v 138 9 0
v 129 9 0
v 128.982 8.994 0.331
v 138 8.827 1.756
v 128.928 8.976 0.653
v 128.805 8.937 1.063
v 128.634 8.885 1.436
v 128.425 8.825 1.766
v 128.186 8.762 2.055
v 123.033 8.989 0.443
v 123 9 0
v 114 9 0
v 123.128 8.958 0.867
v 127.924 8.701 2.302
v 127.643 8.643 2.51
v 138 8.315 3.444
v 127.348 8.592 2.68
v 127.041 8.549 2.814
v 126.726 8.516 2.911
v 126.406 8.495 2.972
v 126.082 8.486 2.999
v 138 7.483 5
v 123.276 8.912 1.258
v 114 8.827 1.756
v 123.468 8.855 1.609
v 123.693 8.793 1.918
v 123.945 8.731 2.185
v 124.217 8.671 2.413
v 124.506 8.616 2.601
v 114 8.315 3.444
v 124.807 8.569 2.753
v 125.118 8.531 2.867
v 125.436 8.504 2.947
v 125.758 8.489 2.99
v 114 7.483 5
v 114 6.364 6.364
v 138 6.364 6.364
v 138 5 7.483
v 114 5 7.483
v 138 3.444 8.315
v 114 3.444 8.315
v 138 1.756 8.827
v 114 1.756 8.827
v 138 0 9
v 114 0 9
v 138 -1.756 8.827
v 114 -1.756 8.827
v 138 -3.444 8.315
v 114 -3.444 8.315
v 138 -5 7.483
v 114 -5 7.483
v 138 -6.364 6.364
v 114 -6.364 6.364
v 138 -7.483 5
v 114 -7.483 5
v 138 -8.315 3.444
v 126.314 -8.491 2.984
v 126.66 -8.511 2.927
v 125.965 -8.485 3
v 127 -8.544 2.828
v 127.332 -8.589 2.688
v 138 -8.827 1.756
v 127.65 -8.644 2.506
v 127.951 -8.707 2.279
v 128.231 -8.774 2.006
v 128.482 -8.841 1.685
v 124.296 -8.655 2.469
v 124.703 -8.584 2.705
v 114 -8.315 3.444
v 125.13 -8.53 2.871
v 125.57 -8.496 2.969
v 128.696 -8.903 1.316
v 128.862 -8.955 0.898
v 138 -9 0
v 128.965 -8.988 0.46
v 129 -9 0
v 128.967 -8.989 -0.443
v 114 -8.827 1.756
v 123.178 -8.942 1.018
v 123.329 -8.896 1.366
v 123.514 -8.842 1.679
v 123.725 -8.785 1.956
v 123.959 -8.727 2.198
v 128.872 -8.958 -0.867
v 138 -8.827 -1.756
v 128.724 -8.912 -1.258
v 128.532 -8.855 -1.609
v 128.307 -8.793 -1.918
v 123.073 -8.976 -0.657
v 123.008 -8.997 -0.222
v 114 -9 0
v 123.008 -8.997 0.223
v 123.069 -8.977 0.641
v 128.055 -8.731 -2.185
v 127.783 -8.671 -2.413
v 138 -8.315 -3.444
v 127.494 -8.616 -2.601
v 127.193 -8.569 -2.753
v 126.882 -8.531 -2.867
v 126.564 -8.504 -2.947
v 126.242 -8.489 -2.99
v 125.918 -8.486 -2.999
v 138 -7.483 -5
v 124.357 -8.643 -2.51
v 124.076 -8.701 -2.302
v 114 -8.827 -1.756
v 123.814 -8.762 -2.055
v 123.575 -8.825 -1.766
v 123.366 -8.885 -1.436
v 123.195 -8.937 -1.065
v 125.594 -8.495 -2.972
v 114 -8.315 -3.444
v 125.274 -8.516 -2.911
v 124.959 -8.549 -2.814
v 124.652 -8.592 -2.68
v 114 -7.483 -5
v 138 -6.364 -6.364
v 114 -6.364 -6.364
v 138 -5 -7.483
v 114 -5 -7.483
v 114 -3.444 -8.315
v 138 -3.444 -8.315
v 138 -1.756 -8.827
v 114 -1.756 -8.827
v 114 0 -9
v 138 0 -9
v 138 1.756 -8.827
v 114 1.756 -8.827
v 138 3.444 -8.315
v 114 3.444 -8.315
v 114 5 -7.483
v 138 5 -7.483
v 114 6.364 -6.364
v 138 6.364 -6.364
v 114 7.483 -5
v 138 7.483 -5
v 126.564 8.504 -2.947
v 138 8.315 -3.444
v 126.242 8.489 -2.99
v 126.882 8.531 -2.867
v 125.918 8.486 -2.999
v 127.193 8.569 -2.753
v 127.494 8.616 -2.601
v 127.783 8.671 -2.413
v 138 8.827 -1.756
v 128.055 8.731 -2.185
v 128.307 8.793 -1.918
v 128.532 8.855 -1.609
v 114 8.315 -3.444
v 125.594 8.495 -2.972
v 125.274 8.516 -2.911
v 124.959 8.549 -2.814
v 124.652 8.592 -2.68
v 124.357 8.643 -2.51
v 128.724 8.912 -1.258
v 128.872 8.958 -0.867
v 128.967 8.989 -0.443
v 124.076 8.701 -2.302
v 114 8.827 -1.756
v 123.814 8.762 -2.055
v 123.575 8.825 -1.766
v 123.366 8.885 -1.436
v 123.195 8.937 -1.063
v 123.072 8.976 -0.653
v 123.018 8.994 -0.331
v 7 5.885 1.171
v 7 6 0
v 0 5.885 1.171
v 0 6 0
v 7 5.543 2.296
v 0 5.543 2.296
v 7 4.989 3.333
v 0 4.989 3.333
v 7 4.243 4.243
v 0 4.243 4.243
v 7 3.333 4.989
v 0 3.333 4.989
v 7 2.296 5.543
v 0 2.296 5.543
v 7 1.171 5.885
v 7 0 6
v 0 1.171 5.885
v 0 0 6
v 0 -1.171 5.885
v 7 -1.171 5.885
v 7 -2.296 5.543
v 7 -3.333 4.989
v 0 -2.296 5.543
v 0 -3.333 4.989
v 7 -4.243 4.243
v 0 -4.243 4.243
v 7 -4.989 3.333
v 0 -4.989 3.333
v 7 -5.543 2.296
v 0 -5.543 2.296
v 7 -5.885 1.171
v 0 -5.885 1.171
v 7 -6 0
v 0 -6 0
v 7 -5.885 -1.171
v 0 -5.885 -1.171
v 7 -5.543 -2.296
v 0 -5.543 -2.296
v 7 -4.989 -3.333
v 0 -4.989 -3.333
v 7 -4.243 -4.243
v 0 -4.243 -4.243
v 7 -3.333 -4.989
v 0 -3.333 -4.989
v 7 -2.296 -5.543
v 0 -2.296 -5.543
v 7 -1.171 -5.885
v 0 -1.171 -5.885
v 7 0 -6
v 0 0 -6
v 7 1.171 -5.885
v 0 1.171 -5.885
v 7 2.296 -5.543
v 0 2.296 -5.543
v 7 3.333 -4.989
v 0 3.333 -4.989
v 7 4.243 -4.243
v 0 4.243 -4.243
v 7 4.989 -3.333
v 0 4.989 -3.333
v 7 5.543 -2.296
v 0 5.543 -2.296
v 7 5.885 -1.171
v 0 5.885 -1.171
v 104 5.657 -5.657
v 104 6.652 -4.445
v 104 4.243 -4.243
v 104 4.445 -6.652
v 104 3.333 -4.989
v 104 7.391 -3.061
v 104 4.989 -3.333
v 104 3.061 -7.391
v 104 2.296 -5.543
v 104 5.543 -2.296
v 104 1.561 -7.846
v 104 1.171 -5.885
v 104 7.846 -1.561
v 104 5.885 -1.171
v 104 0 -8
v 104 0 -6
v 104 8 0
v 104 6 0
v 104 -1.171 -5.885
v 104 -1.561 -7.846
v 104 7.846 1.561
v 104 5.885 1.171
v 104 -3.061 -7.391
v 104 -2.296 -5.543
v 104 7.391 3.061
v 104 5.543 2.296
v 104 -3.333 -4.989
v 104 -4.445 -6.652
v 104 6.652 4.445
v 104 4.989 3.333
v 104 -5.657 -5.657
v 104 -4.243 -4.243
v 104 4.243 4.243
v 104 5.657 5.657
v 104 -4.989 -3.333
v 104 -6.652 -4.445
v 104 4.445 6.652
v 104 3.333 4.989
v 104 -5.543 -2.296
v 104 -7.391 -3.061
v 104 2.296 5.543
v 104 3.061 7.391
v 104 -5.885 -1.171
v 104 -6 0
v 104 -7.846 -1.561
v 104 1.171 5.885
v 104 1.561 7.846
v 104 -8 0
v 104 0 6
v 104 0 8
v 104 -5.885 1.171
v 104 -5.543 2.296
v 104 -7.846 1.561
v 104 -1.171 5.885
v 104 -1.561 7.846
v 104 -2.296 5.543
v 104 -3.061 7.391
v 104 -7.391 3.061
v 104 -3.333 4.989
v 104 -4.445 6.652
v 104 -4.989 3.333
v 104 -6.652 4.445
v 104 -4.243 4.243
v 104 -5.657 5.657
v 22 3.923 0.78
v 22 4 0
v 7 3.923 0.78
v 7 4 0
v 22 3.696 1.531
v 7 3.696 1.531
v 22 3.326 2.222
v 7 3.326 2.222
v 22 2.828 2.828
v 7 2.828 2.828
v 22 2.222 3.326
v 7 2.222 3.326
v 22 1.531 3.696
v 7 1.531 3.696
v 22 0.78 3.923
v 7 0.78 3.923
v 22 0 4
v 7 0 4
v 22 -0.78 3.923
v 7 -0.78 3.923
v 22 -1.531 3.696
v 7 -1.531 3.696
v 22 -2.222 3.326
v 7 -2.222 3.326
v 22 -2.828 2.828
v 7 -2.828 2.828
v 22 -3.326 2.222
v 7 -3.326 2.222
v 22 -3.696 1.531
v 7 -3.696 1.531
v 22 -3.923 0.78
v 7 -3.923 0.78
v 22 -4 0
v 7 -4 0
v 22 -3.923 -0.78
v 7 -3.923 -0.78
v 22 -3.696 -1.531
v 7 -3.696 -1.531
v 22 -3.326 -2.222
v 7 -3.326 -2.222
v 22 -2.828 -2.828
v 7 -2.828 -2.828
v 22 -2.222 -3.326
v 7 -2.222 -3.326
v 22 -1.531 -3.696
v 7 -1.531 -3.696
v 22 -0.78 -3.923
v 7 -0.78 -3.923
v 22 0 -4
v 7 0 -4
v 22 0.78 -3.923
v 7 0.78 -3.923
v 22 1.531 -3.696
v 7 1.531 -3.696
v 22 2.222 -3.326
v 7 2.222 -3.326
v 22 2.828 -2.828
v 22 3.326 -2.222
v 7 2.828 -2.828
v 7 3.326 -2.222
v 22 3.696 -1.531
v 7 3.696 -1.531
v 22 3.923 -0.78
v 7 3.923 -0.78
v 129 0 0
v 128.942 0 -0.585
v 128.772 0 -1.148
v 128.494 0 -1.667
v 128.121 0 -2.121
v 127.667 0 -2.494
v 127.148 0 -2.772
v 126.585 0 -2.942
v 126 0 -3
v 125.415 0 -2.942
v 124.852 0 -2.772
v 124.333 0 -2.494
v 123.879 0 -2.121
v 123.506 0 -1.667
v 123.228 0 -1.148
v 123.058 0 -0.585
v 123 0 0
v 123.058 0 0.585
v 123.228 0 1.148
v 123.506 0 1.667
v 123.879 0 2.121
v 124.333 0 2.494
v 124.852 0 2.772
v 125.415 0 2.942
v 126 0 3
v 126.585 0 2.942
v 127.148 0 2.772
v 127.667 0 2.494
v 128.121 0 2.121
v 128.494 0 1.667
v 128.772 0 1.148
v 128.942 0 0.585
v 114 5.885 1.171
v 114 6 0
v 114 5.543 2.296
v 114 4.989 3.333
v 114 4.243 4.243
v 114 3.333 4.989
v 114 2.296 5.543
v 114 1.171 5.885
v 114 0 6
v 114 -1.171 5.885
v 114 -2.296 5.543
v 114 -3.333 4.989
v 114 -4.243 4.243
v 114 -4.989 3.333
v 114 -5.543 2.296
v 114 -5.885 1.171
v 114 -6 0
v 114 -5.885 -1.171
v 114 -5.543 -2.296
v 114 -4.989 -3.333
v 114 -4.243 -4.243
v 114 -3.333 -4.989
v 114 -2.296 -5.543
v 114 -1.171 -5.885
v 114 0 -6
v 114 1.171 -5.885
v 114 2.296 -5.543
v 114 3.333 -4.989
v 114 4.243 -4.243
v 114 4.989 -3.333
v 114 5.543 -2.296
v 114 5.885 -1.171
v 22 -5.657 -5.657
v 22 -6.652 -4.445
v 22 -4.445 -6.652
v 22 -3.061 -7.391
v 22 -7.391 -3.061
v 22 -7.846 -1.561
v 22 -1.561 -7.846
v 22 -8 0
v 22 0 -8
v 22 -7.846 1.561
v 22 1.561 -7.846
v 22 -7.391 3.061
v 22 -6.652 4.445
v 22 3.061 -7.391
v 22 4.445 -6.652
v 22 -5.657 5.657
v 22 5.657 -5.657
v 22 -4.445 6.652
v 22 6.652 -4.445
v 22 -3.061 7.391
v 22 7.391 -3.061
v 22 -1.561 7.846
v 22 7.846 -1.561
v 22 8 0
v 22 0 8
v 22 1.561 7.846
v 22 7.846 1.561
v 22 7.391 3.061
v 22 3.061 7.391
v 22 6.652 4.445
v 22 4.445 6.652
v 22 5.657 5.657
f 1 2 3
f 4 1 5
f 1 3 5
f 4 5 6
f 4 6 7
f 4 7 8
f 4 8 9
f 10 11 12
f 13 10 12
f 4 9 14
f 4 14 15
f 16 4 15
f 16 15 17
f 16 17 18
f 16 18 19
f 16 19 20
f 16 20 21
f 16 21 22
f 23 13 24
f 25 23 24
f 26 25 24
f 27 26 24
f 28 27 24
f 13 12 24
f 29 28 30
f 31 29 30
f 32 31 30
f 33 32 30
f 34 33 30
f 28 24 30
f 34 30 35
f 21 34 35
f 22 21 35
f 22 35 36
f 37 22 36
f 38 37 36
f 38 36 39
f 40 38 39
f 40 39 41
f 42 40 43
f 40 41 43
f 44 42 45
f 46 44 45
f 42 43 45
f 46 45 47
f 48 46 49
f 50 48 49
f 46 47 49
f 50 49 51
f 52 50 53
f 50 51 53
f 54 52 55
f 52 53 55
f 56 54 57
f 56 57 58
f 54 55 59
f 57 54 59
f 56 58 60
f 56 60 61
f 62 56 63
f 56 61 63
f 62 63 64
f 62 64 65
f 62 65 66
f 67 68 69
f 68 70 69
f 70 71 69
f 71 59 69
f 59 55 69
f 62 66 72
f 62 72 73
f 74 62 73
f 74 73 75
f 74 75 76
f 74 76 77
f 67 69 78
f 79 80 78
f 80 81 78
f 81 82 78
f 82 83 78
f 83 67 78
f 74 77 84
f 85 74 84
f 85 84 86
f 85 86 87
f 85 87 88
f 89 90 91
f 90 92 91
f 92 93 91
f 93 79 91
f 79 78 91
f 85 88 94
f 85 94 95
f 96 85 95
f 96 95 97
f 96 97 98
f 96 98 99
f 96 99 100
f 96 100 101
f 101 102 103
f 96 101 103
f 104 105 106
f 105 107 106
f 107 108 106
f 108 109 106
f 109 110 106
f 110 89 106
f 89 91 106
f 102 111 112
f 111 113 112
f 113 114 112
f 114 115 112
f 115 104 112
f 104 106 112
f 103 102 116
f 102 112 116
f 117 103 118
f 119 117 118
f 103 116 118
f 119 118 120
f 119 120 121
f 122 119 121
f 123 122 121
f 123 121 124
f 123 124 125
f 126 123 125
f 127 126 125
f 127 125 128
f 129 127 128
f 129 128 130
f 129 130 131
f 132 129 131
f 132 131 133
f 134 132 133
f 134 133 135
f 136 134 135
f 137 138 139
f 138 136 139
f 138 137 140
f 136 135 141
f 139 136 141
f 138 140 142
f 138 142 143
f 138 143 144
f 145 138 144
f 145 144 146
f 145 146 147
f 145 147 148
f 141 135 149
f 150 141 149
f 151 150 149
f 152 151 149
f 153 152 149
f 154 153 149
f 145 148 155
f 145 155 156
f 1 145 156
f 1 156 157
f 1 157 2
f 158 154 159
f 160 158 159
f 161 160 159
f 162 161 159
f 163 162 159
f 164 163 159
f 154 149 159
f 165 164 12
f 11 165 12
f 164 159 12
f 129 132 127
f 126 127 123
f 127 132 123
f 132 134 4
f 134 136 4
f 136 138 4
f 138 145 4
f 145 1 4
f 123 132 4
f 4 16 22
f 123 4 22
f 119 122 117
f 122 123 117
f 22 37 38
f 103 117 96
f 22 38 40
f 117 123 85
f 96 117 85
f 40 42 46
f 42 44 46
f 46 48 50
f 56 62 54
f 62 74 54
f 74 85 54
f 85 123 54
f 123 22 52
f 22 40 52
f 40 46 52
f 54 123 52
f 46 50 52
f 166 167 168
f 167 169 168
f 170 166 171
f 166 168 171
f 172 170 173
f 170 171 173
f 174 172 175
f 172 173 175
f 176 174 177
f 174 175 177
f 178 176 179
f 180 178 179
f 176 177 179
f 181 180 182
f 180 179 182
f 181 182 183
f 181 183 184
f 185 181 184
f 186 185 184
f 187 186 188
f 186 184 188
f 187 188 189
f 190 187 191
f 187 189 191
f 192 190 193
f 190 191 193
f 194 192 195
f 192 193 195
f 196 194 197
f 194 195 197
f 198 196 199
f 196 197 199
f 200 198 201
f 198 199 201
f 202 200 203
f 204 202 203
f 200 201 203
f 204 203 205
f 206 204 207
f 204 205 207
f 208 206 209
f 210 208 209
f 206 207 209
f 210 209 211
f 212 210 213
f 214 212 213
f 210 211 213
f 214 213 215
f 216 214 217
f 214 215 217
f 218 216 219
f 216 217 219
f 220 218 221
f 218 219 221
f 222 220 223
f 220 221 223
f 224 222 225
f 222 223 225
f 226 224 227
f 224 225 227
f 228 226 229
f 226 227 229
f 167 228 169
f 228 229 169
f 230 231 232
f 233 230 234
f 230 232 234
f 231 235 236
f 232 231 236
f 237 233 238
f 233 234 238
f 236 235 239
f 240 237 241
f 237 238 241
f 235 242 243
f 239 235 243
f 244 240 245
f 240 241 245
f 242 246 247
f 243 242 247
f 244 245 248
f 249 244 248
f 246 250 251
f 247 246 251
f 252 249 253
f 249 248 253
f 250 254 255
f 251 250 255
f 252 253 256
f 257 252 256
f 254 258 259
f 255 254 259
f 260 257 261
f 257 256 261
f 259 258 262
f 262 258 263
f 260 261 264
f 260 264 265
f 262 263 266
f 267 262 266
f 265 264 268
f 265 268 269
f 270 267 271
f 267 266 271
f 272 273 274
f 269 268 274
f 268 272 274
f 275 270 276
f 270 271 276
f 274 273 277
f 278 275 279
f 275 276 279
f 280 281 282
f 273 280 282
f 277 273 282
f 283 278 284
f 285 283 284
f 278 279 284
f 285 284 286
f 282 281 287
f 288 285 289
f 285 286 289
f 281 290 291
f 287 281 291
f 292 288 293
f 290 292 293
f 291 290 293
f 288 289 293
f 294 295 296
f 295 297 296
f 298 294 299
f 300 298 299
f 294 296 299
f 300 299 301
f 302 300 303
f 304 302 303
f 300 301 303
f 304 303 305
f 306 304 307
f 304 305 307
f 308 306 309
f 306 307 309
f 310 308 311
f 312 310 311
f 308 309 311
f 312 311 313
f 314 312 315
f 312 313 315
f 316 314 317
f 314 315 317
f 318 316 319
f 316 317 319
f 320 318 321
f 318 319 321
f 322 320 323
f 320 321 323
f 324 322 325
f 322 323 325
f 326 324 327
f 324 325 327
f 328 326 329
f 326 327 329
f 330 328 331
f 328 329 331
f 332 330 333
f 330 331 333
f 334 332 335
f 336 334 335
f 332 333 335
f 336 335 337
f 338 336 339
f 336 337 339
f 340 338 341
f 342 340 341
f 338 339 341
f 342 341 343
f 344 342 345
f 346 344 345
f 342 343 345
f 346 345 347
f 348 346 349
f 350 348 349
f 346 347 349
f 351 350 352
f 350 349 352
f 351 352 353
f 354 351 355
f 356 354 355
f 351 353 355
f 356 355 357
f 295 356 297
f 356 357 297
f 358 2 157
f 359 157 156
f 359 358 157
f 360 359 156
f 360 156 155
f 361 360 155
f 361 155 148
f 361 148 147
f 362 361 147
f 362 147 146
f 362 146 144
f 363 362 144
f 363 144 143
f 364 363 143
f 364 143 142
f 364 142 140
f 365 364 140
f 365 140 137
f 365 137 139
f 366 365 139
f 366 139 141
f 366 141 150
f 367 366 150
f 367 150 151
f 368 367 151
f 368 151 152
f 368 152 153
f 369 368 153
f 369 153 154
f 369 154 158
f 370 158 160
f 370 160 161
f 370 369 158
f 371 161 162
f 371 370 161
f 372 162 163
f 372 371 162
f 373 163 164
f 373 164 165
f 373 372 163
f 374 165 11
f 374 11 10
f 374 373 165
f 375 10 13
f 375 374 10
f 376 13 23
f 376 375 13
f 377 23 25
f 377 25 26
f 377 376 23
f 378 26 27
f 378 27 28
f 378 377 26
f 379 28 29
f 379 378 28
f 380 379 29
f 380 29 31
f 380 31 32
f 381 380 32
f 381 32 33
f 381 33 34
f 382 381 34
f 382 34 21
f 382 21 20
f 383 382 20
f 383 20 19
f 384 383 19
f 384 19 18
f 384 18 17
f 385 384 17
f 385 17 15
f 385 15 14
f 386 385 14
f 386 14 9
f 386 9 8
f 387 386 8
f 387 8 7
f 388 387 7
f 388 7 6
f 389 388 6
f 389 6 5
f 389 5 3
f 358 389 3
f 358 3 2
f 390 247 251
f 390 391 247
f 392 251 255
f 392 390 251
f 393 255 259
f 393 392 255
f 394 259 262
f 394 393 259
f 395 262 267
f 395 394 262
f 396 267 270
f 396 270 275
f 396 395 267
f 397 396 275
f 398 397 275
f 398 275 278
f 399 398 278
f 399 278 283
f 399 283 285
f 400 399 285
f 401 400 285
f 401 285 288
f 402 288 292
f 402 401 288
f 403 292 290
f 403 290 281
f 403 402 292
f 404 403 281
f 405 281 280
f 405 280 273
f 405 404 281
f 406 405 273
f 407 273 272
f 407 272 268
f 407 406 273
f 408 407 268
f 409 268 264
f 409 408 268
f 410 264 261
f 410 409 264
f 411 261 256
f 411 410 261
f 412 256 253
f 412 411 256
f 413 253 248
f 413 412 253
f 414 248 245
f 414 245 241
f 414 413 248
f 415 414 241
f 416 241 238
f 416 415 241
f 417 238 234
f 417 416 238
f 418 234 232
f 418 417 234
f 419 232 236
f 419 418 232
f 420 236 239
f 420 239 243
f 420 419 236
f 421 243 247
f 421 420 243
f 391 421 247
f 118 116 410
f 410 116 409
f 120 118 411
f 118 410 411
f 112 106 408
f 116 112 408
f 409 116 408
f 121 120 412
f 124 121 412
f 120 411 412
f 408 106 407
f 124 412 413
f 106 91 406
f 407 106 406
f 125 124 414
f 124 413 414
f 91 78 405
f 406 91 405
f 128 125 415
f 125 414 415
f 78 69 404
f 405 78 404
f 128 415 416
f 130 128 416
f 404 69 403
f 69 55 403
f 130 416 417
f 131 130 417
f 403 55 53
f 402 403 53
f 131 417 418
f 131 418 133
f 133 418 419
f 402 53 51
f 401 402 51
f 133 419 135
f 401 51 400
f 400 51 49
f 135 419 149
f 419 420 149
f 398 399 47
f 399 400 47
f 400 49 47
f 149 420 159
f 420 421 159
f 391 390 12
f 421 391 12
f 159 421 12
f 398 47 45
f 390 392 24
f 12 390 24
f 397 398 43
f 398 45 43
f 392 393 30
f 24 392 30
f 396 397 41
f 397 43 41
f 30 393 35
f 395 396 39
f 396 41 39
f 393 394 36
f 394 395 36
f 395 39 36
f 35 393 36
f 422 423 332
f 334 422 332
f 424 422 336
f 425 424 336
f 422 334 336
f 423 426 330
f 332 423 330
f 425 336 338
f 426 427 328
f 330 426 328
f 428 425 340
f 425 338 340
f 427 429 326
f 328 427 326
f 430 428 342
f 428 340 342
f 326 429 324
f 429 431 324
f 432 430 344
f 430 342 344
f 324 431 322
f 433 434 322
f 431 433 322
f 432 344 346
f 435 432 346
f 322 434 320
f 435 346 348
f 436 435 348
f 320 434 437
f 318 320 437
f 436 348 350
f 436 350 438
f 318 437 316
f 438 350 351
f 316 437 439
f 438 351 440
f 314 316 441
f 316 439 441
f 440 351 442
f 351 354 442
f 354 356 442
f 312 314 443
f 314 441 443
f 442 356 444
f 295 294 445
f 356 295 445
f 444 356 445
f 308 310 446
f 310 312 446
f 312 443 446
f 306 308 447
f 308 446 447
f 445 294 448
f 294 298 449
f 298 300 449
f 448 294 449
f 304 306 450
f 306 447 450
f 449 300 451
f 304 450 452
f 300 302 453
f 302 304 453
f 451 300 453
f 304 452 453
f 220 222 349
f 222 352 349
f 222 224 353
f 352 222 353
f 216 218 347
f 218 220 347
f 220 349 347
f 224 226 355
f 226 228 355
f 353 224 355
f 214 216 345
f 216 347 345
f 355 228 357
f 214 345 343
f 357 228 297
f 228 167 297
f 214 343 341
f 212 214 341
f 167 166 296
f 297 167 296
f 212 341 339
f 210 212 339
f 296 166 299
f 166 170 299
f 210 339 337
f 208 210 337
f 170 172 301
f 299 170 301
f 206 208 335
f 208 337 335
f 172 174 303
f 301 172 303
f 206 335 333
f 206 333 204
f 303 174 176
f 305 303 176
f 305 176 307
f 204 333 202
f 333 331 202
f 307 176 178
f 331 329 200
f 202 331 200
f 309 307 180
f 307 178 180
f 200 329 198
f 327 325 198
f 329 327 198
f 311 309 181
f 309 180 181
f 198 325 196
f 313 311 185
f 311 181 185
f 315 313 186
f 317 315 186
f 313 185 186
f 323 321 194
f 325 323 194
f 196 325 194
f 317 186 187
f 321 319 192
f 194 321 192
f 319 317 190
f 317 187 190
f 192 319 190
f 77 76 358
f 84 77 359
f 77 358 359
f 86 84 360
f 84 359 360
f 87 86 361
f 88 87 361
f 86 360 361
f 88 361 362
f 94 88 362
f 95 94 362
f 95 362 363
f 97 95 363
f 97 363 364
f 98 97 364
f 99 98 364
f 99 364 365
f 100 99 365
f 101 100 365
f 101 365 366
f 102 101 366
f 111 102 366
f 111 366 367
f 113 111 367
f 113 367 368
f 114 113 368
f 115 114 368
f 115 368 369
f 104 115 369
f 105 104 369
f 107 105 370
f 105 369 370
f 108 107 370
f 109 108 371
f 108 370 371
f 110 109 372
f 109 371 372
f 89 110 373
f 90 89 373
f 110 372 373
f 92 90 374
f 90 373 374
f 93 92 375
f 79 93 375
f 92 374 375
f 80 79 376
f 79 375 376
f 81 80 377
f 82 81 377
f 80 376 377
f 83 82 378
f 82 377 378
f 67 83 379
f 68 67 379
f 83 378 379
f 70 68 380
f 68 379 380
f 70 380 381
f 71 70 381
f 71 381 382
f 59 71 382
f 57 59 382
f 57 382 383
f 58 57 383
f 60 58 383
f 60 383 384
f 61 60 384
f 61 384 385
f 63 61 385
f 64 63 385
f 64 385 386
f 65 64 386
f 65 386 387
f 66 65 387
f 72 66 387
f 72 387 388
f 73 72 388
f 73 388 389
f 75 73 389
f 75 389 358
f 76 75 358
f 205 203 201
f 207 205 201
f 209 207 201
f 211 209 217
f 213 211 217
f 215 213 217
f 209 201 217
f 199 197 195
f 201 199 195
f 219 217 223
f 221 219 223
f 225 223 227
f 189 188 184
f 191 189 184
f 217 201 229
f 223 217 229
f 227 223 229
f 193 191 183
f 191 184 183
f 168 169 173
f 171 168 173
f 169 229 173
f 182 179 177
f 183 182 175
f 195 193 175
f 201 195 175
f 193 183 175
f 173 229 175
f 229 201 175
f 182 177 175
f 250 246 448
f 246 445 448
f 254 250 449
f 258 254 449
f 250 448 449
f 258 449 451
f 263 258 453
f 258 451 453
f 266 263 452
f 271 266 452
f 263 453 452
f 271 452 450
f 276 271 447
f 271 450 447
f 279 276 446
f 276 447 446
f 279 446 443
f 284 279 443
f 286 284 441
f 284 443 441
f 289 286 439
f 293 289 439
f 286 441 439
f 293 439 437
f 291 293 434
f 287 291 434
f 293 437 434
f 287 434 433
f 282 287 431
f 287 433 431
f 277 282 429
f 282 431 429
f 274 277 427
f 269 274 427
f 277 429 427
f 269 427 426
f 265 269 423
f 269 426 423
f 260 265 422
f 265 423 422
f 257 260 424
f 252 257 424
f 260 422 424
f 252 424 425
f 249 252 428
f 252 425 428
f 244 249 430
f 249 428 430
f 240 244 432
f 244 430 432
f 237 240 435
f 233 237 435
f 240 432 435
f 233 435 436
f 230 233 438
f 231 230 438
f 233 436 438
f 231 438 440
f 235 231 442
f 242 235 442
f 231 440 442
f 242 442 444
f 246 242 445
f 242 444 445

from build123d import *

# Parameters (mm, degrees)
CUT_EXTRUDE3_DEPTH      = 10
CUT_EXTRUDE3_DEPTH_BACK = 10
SKETCH2_R               = 3


with BuildPart() as part:
    # Sketch1 → Revolve1 (revolve)
    with BuildSketch(Plane.XY):
        Polygon((0, 6), (0, 0), (138, 0), (138, 9), (114, 9), (114, 6), (104, 6), (104, 8), (22, 8), (22, 4), (7, 4), (7, 6), align=None)
    revolve(axis=Axis((0, 0, 0), (1, 0, 0)))

    # Sketch2 → Cut-Extrude3 (cut, two sides: drawn at the far end of the back side and taken through both)
    with BuildSketch(Plane(origin=(0, 0, 0), x_dir=(1, 0, 0), z_dir=(0, 1, 0)).offset(-CUT_EXTRUDE3_DEPTH_BACK)):
        with Locations((126, 0)):
            Circle(SKETCH2_R)
    extrude(amount=CUT_EXTRUDE3_DEPTH + CUT_EXTRUDE3_DEPTH_BACK, mode=Mode.SUBTRACT)


solid = part.part
